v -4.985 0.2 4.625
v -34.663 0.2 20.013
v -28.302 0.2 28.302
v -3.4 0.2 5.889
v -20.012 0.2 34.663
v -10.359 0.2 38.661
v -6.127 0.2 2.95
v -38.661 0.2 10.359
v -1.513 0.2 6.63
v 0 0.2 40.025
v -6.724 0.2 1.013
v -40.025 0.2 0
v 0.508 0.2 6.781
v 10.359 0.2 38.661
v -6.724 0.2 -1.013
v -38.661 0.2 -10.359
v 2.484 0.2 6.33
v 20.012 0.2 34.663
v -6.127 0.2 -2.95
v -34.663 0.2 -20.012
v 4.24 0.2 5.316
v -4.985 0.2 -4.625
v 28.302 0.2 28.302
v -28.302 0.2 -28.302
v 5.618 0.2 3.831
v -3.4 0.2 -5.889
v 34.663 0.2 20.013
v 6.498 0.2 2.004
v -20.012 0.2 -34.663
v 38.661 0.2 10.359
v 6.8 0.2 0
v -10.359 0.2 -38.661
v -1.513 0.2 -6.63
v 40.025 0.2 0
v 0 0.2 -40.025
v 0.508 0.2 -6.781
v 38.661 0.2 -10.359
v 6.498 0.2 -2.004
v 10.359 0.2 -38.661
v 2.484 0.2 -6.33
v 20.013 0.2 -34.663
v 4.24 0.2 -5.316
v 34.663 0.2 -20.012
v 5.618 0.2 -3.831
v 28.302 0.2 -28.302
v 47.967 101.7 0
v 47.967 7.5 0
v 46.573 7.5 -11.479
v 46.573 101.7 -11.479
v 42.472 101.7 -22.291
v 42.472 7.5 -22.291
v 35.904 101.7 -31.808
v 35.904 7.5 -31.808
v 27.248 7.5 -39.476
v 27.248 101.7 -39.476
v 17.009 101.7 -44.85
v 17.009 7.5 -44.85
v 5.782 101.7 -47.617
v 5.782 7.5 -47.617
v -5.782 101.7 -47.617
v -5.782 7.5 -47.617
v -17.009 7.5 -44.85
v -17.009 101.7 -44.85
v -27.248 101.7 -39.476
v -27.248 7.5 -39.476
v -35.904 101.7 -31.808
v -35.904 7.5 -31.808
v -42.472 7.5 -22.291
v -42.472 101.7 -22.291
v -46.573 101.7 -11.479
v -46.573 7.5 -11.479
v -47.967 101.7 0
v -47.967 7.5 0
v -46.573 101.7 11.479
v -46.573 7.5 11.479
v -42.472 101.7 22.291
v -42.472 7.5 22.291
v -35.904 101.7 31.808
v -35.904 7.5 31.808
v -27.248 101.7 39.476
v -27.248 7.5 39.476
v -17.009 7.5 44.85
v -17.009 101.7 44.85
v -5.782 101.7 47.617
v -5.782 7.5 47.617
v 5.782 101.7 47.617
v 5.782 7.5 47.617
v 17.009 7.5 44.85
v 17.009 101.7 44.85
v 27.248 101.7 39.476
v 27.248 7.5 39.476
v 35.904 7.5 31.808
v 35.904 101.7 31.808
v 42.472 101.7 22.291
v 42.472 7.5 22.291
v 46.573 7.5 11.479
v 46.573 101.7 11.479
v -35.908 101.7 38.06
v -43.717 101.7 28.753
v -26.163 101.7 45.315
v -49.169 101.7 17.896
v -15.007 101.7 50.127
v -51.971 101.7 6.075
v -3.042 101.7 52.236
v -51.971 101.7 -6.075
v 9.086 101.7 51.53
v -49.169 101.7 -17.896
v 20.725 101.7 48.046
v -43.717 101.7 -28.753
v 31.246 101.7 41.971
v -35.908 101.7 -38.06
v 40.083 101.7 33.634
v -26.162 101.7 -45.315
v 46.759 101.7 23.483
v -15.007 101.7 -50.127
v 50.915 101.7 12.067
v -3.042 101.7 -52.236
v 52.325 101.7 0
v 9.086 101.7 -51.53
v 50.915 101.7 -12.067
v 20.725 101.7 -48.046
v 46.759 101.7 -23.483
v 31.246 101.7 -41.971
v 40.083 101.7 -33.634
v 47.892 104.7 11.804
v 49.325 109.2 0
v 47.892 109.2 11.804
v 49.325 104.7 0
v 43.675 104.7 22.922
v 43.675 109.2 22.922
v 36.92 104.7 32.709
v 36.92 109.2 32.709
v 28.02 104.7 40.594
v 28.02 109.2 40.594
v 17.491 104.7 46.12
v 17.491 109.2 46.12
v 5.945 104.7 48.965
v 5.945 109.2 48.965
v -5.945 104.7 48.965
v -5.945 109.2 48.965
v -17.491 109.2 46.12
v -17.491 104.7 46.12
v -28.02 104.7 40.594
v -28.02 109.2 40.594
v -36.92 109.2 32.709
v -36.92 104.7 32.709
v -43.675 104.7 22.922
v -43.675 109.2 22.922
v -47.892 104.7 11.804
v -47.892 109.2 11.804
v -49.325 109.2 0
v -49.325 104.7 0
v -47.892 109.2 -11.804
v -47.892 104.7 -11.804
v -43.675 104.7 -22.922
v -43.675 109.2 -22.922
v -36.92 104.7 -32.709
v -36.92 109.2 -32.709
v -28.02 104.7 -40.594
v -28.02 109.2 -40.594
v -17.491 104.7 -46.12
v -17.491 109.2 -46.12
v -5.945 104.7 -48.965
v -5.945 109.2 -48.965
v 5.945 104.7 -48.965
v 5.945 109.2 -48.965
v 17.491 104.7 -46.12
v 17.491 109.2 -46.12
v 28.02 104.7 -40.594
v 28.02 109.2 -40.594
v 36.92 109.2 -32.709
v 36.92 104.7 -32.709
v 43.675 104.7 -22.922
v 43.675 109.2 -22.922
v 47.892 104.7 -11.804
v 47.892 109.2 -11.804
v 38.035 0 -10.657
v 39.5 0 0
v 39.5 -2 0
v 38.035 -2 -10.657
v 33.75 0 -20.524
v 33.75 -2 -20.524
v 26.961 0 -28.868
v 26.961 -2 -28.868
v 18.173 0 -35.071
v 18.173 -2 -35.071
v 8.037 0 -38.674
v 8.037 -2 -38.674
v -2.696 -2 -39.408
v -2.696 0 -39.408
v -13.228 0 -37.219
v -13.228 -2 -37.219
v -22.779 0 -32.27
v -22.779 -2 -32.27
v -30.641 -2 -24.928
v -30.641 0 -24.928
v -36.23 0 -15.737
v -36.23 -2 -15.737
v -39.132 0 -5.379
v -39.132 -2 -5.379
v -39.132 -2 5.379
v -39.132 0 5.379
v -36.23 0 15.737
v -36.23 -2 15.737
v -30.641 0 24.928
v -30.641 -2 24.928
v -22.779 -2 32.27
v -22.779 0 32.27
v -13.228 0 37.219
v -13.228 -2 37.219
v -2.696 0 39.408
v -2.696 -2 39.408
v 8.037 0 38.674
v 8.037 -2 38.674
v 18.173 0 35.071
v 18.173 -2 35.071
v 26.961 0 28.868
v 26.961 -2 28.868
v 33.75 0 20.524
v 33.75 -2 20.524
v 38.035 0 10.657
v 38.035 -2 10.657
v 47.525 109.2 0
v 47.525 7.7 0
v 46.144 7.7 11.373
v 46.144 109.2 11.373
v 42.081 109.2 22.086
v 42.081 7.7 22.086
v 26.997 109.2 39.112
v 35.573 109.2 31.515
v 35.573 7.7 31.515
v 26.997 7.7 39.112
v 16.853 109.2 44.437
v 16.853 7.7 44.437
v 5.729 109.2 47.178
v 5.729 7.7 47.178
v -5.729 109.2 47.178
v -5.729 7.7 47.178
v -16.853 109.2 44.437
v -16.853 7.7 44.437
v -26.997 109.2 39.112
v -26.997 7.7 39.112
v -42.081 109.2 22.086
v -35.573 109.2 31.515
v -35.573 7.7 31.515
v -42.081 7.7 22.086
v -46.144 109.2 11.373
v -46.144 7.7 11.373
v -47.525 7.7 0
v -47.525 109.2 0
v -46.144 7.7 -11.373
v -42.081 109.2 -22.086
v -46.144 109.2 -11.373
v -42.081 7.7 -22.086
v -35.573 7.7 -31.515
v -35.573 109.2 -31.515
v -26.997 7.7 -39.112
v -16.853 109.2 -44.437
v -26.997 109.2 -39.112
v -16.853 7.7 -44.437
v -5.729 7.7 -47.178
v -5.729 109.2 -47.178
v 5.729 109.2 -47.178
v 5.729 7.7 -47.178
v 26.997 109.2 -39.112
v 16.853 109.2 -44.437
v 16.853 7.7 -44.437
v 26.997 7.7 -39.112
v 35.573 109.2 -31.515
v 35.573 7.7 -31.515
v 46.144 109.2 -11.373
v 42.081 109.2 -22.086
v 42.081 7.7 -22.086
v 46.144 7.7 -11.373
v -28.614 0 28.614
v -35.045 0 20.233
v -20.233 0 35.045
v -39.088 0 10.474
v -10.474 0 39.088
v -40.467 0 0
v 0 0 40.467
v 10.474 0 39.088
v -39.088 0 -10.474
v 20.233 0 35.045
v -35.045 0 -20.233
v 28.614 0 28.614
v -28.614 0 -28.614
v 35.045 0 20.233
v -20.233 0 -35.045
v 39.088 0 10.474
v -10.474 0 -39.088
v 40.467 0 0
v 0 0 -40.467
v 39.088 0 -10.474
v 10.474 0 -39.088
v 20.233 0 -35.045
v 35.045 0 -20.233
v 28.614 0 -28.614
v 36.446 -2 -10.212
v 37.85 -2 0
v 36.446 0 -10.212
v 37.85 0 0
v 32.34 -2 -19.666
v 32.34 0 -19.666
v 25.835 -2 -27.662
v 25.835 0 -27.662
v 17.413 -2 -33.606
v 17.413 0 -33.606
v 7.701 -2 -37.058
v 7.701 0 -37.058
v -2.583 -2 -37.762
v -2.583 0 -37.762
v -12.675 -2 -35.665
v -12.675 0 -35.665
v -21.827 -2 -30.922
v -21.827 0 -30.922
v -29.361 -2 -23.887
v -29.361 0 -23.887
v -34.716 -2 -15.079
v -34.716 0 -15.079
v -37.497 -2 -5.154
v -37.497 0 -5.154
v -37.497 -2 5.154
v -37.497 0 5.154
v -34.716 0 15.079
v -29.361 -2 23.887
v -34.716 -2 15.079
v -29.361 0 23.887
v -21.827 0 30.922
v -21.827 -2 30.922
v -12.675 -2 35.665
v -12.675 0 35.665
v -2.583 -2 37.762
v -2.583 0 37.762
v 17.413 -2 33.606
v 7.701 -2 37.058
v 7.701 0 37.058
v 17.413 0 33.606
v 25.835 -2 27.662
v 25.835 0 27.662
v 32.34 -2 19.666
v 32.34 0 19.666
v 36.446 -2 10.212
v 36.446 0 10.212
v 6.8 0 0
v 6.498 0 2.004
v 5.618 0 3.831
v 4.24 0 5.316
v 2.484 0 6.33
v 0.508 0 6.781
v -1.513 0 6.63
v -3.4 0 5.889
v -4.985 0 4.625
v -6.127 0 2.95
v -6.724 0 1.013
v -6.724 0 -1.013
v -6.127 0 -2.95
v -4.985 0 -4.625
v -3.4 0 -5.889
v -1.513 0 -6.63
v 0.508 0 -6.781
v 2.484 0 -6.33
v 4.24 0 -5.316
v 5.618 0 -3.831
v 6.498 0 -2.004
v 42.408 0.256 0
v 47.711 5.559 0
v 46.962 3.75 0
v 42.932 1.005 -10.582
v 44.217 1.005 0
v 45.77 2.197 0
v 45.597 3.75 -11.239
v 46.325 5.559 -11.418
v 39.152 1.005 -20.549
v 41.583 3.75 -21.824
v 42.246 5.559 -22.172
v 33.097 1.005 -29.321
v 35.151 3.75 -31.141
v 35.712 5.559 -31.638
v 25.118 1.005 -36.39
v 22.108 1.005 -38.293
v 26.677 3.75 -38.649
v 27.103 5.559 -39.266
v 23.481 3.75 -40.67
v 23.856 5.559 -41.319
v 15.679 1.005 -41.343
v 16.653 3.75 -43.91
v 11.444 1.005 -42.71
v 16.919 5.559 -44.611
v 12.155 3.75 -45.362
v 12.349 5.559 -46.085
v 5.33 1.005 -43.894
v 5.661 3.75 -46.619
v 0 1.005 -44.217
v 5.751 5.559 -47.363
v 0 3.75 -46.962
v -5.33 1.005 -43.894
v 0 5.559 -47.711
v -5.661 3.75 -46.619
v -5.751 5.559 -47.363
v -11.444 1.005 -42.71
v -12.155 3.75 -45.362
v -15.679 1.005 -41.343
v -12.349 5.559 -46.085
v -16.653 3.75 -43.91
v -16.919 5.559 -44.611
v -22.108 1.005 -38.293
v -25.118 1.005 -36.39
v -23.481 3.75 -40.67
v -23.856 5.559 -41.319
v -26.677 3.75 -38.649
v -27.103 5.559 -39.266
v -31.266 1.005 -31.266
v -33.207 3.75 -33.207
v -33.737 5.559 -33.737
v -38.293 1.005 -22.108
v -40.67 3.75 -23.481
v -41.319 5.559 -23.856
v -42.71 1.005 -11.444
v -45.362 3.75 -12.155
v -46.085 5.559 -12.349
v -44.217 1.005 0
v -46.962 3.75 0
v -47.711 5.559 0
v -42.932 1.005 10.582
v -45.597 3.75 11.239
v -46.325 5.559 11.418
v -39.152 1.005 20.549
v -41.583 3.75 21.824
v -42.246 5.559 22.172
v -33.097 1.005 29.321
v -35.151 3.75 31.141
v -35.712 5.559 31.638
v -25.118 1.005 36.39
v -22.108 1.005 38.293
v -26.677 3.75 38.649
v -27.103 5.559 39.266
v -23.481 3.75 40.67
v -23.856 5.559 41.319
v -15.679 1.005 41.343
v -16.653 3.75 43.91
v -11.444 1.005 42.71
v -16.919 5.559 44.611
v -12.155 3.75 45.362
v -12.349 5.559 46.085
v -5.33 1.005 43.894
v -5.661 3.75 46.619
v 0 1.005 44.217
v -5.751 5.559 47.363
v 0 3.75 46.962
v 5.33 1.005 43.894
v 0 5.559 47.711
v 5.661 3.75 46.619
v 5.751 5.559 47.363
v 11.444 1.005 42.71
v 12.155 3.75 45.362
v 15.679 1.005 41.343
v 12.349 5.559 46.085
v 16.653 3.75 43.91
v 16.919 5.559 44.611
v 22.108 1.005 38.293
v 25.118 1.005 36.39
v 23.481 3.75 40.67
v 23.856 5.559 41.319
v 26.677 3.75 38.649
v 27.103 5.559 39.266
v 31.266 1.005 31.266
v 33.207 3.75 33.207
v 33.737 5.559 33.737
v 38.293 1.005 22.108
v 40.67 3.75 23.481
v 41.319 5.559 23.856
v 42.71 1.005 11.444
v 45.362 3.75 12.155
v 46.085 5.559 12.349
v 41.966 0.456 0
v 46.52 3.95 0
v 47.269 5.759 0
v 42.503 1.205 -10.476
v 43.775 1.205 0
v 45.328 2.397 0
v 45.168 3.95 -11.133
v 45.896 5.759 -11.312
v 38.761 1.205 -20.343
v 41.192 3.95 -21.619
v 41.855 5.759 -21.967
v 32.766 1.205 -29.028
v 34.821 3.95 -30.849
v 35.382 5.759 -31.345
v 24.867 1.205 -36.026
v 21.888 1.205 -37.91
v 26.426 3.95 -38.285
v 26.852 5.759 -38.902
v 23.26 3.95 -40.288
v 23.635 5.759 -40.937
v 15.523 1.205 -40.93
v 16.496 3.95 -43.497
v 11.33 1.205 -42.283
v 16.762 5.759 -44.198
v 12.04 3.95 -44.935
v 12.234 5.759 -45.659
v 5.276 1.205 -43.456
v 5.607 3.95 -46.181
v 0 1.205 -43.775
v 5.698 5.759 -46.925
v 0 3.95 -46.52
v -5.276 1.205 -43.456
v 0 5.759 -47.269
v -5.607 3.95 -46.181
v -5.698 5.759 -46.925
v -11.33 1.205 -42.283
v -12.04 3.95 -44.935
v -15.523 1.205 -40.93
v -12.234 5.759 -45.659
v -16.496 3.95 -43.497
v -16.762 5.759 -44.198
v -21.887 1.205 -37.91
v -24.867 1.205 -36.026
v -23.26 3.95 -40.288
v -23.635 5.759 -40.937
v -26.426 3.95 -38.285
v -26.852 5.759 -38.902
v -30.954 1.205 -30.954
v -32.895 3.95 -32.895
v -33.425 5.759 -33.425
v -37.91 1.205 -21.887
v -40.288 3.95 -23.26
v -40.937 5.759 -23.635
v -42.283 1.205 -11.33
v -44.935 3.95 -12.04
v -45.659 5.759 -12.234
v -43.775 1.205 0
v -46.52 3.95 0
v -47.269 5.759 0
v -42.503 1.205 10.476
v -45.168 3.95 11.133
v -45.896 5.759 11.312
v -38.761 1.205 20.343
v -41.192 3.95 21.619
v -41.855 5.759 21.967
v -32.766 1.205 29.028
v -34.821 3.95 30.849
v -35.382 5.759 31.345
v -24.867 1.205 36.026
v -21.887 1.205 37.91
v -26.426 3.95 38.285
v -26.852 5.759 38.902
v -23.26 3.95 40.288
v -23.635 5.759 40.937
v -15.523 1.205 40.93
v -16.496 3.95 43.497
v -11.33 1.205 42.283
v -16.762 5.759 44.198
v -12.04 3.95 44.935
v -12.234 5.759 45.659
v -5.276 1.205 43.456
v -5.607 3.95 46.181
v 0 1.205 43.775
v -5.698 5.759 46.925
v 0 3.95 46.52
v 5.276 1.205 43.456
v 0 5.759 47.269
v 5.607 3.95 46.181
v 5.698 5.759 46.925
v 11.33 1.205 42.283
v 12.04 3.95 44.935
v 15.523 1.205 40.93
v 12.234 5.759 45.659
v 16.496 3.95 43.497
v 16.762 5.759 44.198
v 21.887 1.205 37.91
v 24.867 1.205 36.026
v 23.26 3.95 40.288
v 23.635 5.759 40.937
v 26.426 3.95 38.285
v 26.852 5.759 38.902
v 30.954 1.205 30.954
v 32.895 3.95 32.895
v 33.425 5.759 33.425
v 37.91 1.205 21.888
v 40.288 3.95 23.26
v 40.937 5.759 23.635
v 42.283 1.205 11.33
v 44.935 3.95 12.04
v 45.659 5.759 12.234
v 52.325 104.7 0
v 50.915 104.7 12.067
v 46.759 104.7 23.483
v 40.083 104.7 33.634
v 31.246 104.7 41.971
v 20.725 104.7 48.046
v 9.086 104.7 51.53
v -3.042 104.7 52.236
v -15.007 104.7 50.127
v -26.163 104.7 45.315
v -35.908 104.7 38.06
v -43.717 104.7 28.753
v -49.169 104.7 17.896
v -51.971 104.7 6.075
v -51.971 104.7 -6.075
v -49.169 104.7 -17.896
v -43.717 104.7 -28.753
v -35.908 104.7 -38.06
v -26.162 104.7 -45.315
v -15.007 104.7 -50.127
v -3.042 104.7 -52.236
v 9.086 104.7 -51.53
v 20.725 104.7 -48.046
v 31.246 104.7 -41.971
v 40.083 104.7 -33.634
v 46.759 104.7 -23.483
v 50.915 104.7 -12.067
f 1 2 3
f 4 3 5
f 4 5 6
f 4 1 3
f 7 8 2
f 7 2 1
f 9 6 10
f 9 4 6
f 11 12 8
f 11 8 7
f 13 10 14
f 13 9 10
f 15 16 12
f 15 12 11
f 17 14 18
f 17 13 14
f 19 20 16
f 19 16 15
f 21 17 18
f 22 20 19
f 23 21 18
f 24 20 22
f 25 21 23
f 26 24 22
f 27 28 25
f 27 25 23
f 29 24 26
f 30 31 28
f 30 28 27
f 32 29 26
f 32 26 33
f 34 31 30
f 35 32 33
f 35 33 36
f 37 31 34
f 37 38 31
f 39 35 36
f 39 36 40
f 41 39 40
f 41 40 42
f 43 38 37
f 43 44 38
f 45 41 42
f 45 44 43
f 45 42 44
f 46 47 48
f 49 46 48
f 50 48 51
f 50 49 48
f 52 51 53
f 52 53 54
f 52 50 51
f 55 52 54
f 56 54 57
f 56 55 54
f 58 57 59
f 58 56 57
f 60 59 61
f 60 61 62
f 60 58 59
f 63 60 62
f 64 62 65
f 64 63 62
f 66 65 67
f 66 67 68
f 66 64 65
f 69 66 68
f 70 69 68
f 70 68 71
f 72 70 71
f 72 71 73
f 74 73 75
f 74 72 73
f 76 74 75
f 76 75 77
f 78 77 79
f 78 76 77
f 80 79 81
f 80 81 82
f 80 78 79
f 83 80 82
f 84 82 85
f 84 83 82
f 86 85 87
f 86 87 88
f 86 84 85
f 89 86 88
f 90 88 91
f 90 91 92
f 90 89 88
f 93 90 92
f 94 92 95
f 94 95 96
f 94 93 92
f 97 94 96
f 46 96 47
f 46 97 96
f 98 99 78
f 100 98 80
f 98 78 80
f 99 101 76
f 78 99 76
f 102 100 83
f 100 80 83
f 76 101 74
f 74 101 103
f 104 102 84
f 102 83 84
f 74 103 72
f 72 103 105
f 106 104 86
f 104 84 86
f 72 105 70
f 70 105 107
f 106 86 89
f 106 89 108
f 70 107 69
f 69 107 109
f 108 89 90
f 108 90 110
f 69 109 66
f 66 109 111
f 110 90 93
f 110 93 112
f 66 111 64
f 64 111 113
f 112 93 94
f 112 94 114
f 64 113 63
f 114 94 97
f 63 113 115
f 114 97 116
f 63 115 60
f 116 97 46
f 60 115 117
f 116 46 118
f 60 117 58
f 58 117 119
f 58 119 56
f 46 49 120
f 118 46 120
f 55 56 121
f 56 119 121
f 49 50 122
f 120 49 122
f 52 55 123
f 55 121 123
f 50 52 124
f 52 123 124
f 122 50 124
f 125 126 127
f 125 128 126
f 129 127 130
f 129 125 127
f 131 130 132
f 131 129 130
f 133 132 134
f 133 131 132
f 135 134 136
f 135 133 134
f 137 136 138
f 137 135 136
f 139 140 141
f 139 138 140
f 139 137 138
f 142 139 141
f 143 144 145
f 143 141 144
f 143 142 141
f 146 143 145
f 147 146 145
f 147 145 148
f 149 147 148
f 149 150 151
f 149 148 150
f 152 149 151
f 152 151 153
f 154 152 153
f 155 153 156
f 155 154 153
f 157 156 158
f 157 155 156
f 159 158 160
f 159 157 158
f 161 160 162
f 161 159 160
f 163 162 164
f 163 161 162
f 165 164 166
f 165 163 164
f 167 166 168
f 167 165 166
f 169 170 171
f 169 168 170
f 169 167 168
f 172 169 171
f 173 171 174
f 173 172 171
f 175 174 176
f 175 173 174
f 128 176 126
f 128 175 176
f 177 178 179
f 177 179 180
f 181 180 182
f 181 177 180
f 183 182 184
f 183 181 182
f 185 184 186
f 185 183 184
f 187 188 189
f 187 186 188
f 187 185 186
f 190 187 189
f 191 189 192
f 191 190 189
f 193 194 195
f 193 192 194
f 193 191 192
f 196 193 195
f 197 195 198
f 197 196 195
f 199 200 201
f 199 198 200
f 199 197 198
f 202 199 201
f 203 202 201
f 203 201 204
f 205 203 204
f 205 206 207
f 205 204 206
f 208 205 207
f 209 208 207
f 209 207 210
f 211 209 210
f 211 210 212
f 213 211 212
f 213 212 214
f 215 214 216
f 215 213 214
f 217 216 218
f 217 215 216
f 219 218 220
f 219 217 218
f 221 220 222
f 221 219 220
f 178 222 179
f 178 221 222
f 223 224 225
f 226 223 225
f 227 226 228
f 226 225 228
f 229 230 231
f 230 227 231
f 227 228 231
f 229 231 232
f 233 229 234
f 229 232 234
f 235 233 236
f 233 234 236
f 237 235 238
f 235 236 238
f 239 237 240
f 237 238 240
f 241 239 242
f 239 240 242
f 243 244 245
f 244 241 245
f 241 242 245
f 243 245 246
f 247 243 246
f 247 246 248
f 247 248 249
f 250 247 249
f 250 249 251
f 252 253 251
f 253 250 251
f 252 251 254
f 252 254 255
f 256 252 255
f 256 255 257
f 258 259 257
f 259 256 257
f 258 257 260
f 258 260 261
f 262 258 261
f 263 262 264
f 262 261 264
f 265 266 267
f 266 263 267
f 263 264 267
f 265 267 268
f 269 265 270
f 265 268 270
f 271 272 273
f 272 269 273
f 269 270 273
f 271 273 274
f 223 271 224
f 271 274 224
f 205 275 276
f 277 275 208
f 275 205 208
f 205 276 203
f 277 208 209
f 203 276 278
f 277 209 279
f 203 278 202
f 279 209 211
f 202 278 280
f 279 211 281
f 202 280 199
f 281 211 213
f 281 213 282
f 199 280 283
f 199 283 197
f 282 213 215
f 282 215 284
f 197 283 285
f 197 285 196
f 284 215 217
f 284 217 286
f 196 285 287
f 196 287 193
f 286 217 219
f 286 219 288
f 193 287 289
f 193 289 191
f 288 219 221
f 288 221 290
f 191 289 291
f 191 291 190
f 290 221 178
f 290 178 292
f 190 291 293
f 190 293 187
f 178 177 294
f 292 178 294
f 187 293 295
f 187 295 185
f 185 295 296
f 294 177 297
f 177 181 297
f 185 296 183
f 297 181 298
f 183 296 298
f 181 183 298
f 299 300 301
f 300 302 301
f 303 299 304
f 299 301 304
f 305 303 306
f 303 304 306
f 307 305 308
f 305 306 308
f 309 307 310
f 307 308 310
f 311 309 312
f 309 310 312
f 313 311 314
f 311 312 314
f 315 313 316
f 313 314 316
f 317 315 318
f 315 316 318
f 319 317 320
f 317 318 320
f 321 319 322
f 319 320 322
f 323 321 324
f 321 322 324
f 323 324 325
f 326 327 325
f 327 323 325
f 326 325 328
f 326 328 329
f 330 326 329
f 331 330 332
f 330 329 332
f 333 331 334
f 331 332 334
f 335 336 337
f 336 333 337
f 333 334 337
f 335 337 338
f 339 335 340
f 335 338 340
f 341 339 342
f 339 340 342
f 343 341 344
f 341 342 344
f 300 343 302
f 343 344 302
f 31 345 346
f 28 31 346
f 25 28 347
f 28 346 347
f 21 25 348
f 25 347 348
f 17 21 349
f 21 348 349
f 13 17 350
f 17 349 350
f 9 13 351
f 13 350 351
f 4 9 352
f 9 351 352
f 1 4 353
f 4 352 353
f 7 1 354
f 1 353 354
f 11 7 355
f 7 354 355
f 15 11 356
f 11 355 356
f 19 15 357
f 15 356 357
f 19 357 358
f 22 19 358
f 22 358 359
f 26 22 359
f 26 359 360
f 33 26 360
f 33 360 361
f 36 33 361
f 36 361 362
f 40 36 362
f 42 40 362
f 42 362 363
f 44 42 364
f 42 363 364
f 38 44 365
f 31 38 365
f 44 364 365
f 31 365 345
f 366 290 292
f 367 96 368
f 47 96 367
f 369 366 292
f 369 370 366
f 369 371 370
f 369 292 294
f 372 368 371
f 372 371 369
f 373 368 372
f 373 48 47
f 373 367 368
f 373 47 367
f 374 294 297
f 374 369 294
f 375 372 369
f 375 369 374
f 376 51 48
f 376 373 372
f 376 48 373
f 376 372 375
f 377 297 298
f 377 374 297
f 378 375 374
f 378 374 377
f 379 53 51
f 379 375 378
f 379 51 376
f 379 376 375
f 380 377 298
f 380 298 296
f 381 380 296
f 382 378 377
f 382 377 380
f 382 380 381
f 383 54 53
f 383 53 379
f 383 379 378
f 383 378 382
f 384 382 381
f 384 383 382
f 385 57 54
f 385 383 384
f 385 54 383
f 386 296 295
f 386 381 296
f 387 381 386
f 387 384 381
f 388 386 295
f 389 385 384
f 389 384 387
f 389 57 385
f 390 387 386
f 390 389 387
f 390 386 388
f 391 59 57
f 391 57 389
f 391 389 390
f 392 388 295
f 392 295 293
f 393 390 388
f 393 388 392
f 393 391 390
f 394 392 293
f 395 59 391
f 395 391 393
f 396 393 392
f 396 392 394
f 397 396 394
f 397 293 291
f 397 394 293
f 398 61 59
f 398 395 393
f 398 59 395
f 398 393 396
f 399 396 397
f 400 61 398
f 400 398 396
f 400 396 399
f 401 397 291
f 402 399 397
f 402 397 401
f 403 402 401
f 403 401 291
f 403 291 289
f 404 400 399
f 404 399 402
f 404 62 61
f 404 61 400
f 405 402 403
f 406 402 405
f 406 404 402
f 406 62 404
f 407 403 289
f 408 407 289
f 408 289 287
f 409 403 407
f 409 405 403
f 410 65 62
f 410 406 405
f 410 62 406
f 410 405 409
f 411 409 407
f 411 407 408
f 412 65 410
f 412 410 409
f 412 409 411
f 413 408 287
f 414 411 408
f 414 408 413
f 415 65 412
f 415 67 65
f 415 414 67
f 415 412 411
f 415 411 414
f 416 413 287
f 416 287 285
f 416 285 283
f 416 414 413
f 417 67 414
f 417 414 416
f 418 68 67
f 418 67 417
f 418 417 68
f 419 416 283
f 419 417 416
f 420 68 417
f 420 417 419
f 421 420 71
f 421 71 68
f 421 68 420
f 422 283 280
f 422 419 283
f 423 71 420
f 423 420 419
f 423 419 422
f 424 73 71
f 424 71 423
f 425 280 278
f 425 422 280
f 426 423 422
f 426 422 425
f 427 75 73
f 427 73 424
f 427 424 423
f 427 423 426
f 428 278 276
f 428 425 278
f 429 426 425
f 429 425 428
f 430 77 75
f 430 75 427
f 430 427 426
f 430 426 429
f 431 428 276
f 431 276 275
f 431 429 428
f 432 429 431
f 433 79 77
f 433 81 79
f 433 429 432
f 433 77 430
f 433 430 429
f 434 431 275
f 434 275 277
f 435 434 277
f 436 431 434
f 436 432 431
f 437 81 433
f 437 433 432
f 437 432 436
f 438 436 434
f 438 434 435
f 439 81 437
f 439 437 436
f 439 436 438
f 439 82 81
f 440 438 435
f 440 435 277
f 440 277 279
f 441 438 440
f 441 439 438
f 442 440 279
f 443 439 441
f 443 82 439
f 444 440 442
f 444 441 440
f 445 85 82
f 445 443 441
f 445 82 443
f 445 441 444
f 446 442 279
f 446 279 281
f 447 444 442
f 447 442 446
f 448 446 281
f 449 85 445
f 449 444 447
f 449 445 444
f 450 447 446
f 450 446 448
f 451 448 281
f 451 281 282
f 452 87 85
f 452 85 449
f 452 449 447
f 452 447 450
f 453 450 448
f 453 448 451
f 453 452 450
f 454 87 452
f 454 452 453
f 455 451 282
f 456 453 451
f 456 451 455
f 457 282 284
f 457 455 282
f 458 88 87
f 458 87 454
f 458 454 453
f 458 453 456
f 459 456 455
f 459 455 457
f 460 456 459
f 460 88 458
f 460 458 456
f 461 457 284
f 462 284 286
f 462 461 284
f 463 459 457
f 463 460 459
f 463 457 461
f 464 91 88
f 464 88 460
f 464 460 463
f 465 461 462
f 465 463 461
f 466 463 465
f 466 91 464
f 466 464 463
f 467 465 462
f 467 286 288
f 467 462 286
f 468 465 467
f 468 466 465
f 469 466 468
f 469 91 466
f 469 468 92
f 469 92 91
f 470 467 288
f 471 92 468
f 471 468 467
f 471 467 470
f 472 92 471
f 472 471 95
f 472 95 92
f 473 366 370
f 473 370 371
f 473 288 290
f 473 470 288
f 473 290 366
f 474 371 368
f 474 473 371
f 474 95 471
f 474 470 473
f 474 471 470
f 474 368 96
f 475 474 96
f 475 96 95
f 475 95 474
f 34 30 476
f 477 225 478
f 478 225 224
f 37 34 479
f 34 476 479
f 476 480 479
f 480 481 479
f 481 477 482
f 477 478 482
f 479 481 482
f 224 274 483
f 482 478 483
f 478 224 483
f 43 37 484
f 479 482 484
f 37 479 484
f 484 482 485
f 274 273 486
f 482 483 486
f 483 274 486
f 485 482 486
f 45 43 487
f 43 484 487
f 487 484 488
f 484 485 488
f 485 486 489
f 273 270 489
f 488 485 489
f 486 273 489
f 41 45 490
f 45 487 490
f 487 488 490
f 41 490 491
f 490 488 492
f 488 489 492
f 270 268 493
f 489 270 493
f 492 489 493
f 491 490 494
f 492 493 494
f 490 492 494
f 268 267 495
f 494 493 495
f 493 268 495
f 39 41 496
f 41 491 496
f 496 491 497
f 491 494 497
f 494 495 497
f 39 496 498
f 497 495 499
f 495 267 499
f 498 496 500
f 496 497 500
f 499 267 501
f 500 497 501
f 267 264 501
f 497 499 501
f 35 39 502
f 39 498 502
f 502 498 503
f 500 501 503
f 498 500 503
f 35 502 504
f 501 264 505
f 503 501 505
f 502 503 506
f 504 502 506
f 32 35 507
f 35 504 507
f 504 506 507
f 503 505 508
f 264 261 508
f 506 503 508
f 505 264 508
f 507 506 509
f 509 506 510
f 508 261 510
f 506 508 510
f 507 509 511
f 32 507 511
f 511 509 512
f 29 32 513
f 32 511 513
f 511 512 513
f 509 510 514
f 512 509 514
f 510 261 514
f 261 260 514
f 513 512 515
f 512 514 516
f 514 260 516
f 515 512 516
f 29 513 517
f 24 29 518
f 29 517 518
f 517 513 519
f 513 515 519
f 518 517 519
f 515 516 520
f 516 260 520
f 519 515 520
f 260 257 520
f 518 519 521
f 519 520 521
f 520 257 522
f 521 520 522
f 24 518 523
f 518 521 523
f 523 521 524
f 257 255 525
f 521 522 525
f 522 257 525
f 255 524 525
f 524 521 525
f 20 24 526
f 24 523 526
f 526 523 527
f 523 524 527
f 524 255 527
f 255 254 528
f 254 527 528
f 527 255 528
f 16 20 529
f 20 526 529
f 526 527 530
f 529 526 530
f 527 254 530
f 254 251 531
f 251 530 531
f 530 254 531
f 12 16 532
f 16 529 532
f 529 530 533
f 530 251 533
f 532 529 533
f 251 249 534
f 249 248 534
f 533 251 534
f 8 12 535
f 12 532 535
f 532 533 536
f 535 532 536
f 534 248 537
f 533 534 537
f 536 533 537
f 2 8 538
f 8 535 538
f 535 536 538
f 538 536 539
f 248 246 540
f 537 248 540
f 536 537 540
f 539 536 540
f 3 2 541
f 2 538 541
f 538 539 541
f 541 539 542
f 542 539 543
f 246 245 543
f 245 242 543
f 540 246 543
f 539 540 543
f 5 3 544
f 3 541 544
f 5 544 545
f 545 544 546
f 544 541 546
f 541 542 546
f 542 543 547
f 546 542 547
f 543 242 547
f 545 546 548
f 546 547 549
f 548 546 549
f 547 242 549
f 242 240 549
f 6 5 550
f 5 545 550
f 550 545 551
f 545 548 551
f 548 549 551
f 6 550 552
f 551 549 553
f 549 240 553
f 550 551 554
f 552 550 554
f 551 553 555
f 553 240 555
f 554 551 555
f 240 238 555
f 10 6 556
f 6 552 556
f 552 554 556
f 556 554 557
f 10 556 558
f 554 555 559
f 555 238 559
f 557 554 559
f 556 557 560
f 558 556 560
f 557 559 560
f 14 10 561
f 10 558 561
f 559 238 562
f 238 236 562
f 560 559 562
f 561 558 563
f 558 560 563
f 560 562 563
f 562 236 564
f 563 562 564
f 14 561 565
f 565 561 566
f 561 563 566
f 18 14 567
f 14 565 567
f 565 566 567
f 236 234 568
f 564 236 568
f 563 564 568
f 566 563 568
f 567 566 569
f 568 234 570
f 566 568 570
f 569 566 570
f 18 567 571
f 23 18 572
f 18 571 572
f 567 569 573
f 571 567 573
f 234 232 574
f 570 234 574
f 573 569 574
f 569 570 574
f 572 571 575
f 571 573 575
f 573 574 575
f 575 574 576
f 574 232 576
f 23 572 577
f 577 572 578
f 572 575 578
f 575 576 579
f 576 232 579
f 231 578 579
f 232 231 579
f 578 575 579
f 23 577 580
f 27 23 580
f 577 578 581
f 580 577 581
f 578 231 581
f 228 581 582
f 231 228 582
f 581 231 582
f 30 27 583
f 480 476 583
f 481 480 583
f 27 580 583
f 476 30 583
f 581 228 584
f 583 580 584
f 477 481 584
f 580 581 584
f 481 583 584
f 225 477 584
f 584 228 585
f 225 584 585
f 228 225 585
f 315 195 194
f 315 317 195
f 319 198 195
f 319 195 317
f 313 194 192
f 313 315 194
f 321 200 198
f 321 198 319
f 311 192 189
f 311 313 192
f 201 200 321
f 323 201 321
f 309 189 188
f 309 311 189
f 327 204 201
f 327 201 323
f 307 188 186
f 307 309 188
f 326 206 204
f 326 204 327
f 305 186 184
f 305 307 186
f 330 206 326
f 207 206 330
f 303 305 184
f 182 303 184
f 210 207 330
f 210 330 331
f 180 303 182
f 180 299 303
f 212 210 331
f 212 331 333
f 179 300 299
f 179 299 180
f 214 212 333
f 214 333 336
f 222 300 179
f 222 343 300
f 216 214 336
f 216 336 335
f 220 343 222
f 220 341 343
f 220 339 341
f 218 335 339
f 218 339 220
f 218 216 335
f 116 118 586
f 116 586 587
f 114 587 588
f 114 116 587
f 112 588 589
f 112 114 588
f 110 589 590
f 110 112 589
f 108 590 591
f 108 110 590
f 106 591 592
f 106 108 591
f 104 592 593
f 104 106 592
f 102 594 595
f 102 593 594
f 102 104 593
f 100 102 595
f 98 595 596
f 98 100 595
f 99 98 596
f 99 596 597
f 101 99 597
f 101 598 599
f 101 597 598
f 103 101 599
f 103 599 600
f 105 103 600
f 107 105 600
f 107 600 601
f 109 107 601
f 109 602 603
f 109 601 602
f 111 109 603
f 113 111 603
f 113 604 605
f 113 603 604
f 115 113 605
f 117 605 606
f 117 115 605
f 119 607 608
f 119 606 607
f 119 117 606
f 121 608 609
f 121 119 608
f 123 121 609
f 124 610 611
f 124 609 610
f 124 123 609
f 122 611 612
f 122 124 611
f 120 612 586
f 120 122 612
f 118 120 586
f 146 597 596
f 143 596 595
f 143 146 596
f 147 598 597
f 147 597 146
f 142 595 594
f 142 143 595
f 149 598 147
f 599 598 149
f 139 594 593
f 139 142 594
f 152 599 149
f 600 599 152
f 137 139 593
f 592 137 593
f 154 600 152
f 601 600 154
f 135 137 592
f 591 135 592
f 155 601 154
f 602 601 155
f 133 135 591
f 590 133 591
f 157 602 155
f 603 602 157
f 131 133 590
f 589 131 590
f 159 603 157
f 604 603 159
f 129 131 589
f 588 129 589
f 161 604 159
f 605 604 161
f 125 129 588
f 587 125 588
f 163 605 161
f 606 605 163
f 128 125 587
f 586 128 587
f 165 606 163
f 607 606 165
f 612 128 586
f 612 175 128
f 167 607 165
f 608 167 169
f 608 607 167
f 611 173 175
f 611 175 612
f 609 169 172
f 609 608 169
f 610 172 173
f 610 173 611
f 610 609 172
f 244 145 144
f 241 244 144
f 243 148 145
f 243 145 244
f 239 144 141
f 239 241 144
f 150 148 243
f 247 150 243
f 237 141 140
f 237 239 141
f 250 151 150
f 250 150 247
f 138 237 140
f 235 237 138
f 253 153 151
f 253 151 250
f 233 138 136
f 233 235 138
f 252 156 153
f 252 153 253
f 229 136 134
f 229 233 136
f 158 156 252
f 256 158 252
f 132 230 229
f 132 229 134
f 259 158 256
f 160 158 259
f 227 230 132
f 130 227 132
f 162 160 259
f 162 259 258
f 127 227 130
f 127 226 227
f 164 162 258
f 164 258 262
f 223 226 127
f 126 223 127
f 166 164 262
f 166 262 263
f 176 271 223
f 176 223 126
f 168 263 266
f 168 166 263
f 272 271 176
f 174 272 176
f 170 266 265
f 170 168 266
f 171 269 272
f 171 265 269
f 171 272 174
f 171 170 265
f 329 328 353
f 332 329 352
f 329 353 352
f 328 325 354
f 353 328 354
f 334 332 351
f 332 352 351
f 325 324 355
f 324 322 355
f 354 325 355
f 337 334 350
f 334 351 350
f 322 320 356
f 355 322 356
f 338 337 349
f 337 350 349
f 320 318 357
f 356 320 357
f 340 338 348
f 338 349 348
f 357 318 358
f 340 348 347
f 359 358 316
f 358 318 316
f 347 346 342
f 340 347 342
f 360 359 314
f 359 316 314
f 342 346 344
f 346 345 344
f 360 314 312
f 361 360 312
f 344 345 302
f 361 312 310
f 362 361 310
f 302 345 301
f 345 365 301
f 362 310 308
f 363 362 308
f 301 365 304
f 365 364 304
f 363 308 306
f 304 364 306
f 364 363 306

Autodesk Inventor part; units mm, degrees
ref_plane "YZ Plane" through (0, 0, 0) normal (1, 0, 0) x (0, 1, 0)
ref_plane "XZ Plane" through (0, 0, 0) normal (0, 1, 0) x (-1, 0, 0)
ref_plane "XY Plane" through (0, 0, 0) normal (0, 0, 1) x (1, 0, 0)
sketch "Sketch1" plane through (0, 0, 0) normal (0, 0, 1) x (1, 0, 0)
  line L0 (46.8, 0) -> (47.9667, 0)
  line L1 (47.9667, 7.5) -> (47.9667, 101.6997)
  line L2 (47.725, 109.1997) -> (47.525, 109.1997)
  line L3 (47.525, 109.1997) -> (47.525, 7.7)
  line L4 (47.525, 109.1997) -> (49.325, 109.1997)
  line L5 (49.325, 109.1997) -> (49.325, 104.6997)
  line L6 (49.325, 104.6997) -> (52.325, 104.6997)
  line L7 (52.325, 104.6997) -> (52.325, 101.6997)
  line L8 (52.325, 101.6997) -> (49.325, 101.6997)
  line L9 (49.325, 101.6997) -> (47.9667, 101.6997)
  line L10 (0, 0) -> (0, 20.8136)
  line L11 (40.4667, 0) -> (-0.2292, 0)
  line L12 (0, 0) -> (0, 0.2)
  line L13 (0, 0.2) -> (40.025, 0.2)
  arc A0 (40.025, 0.2) -> (47.525, 7.7) centre (40.025, 7.7) ccw
  arc A1 (40.4667, 0) -> (47.9667, 7.5) centre (40.4667, 7.5) ccw
  dimension "d1" = 0.2
  dimension "d2" = 109.2
  dimension "d3" = 1.8
  dimension "d4" = 4.5
  dimension "d5" = 3
  dimension "d6" = 3
  dimension "d7" = 0.2
  dimension "d8" = 90
  dimension "d14" = 7.5
  dimension "d15" = 0.2
revolve "Revolution1" add sketch "Sketch1" angle 360 about axis through (0, 0, 0) along (0, 1, 0)
sketch "Sketch2" plane through (0, 0, 0) normal (0, -1, 0) x (1, 0, 0)
  circle A0 centre (0, 0) radius 6.8
  dimension "d11" = 13.6
extrude "Extrusion1" cut sketch "Sketch2" against normal blind 1
sketch "Sketch3" plane through (0, 0, 0) normal (0, -1, 0) x (1, 0, 0)
  circle A0 centre (0, 0) radius 37.85
  circle A1 centre (0, 0) radius 6.8 projected
  circle A2 centre (0, 0) radius 39.5
  dimension "d16" = 75.7
  dimension "d17" = 79
extrude "Extrusion2" add sketch "Sketch3" along normal blind 2 contours A2
properties part number "ContenedorTest"
